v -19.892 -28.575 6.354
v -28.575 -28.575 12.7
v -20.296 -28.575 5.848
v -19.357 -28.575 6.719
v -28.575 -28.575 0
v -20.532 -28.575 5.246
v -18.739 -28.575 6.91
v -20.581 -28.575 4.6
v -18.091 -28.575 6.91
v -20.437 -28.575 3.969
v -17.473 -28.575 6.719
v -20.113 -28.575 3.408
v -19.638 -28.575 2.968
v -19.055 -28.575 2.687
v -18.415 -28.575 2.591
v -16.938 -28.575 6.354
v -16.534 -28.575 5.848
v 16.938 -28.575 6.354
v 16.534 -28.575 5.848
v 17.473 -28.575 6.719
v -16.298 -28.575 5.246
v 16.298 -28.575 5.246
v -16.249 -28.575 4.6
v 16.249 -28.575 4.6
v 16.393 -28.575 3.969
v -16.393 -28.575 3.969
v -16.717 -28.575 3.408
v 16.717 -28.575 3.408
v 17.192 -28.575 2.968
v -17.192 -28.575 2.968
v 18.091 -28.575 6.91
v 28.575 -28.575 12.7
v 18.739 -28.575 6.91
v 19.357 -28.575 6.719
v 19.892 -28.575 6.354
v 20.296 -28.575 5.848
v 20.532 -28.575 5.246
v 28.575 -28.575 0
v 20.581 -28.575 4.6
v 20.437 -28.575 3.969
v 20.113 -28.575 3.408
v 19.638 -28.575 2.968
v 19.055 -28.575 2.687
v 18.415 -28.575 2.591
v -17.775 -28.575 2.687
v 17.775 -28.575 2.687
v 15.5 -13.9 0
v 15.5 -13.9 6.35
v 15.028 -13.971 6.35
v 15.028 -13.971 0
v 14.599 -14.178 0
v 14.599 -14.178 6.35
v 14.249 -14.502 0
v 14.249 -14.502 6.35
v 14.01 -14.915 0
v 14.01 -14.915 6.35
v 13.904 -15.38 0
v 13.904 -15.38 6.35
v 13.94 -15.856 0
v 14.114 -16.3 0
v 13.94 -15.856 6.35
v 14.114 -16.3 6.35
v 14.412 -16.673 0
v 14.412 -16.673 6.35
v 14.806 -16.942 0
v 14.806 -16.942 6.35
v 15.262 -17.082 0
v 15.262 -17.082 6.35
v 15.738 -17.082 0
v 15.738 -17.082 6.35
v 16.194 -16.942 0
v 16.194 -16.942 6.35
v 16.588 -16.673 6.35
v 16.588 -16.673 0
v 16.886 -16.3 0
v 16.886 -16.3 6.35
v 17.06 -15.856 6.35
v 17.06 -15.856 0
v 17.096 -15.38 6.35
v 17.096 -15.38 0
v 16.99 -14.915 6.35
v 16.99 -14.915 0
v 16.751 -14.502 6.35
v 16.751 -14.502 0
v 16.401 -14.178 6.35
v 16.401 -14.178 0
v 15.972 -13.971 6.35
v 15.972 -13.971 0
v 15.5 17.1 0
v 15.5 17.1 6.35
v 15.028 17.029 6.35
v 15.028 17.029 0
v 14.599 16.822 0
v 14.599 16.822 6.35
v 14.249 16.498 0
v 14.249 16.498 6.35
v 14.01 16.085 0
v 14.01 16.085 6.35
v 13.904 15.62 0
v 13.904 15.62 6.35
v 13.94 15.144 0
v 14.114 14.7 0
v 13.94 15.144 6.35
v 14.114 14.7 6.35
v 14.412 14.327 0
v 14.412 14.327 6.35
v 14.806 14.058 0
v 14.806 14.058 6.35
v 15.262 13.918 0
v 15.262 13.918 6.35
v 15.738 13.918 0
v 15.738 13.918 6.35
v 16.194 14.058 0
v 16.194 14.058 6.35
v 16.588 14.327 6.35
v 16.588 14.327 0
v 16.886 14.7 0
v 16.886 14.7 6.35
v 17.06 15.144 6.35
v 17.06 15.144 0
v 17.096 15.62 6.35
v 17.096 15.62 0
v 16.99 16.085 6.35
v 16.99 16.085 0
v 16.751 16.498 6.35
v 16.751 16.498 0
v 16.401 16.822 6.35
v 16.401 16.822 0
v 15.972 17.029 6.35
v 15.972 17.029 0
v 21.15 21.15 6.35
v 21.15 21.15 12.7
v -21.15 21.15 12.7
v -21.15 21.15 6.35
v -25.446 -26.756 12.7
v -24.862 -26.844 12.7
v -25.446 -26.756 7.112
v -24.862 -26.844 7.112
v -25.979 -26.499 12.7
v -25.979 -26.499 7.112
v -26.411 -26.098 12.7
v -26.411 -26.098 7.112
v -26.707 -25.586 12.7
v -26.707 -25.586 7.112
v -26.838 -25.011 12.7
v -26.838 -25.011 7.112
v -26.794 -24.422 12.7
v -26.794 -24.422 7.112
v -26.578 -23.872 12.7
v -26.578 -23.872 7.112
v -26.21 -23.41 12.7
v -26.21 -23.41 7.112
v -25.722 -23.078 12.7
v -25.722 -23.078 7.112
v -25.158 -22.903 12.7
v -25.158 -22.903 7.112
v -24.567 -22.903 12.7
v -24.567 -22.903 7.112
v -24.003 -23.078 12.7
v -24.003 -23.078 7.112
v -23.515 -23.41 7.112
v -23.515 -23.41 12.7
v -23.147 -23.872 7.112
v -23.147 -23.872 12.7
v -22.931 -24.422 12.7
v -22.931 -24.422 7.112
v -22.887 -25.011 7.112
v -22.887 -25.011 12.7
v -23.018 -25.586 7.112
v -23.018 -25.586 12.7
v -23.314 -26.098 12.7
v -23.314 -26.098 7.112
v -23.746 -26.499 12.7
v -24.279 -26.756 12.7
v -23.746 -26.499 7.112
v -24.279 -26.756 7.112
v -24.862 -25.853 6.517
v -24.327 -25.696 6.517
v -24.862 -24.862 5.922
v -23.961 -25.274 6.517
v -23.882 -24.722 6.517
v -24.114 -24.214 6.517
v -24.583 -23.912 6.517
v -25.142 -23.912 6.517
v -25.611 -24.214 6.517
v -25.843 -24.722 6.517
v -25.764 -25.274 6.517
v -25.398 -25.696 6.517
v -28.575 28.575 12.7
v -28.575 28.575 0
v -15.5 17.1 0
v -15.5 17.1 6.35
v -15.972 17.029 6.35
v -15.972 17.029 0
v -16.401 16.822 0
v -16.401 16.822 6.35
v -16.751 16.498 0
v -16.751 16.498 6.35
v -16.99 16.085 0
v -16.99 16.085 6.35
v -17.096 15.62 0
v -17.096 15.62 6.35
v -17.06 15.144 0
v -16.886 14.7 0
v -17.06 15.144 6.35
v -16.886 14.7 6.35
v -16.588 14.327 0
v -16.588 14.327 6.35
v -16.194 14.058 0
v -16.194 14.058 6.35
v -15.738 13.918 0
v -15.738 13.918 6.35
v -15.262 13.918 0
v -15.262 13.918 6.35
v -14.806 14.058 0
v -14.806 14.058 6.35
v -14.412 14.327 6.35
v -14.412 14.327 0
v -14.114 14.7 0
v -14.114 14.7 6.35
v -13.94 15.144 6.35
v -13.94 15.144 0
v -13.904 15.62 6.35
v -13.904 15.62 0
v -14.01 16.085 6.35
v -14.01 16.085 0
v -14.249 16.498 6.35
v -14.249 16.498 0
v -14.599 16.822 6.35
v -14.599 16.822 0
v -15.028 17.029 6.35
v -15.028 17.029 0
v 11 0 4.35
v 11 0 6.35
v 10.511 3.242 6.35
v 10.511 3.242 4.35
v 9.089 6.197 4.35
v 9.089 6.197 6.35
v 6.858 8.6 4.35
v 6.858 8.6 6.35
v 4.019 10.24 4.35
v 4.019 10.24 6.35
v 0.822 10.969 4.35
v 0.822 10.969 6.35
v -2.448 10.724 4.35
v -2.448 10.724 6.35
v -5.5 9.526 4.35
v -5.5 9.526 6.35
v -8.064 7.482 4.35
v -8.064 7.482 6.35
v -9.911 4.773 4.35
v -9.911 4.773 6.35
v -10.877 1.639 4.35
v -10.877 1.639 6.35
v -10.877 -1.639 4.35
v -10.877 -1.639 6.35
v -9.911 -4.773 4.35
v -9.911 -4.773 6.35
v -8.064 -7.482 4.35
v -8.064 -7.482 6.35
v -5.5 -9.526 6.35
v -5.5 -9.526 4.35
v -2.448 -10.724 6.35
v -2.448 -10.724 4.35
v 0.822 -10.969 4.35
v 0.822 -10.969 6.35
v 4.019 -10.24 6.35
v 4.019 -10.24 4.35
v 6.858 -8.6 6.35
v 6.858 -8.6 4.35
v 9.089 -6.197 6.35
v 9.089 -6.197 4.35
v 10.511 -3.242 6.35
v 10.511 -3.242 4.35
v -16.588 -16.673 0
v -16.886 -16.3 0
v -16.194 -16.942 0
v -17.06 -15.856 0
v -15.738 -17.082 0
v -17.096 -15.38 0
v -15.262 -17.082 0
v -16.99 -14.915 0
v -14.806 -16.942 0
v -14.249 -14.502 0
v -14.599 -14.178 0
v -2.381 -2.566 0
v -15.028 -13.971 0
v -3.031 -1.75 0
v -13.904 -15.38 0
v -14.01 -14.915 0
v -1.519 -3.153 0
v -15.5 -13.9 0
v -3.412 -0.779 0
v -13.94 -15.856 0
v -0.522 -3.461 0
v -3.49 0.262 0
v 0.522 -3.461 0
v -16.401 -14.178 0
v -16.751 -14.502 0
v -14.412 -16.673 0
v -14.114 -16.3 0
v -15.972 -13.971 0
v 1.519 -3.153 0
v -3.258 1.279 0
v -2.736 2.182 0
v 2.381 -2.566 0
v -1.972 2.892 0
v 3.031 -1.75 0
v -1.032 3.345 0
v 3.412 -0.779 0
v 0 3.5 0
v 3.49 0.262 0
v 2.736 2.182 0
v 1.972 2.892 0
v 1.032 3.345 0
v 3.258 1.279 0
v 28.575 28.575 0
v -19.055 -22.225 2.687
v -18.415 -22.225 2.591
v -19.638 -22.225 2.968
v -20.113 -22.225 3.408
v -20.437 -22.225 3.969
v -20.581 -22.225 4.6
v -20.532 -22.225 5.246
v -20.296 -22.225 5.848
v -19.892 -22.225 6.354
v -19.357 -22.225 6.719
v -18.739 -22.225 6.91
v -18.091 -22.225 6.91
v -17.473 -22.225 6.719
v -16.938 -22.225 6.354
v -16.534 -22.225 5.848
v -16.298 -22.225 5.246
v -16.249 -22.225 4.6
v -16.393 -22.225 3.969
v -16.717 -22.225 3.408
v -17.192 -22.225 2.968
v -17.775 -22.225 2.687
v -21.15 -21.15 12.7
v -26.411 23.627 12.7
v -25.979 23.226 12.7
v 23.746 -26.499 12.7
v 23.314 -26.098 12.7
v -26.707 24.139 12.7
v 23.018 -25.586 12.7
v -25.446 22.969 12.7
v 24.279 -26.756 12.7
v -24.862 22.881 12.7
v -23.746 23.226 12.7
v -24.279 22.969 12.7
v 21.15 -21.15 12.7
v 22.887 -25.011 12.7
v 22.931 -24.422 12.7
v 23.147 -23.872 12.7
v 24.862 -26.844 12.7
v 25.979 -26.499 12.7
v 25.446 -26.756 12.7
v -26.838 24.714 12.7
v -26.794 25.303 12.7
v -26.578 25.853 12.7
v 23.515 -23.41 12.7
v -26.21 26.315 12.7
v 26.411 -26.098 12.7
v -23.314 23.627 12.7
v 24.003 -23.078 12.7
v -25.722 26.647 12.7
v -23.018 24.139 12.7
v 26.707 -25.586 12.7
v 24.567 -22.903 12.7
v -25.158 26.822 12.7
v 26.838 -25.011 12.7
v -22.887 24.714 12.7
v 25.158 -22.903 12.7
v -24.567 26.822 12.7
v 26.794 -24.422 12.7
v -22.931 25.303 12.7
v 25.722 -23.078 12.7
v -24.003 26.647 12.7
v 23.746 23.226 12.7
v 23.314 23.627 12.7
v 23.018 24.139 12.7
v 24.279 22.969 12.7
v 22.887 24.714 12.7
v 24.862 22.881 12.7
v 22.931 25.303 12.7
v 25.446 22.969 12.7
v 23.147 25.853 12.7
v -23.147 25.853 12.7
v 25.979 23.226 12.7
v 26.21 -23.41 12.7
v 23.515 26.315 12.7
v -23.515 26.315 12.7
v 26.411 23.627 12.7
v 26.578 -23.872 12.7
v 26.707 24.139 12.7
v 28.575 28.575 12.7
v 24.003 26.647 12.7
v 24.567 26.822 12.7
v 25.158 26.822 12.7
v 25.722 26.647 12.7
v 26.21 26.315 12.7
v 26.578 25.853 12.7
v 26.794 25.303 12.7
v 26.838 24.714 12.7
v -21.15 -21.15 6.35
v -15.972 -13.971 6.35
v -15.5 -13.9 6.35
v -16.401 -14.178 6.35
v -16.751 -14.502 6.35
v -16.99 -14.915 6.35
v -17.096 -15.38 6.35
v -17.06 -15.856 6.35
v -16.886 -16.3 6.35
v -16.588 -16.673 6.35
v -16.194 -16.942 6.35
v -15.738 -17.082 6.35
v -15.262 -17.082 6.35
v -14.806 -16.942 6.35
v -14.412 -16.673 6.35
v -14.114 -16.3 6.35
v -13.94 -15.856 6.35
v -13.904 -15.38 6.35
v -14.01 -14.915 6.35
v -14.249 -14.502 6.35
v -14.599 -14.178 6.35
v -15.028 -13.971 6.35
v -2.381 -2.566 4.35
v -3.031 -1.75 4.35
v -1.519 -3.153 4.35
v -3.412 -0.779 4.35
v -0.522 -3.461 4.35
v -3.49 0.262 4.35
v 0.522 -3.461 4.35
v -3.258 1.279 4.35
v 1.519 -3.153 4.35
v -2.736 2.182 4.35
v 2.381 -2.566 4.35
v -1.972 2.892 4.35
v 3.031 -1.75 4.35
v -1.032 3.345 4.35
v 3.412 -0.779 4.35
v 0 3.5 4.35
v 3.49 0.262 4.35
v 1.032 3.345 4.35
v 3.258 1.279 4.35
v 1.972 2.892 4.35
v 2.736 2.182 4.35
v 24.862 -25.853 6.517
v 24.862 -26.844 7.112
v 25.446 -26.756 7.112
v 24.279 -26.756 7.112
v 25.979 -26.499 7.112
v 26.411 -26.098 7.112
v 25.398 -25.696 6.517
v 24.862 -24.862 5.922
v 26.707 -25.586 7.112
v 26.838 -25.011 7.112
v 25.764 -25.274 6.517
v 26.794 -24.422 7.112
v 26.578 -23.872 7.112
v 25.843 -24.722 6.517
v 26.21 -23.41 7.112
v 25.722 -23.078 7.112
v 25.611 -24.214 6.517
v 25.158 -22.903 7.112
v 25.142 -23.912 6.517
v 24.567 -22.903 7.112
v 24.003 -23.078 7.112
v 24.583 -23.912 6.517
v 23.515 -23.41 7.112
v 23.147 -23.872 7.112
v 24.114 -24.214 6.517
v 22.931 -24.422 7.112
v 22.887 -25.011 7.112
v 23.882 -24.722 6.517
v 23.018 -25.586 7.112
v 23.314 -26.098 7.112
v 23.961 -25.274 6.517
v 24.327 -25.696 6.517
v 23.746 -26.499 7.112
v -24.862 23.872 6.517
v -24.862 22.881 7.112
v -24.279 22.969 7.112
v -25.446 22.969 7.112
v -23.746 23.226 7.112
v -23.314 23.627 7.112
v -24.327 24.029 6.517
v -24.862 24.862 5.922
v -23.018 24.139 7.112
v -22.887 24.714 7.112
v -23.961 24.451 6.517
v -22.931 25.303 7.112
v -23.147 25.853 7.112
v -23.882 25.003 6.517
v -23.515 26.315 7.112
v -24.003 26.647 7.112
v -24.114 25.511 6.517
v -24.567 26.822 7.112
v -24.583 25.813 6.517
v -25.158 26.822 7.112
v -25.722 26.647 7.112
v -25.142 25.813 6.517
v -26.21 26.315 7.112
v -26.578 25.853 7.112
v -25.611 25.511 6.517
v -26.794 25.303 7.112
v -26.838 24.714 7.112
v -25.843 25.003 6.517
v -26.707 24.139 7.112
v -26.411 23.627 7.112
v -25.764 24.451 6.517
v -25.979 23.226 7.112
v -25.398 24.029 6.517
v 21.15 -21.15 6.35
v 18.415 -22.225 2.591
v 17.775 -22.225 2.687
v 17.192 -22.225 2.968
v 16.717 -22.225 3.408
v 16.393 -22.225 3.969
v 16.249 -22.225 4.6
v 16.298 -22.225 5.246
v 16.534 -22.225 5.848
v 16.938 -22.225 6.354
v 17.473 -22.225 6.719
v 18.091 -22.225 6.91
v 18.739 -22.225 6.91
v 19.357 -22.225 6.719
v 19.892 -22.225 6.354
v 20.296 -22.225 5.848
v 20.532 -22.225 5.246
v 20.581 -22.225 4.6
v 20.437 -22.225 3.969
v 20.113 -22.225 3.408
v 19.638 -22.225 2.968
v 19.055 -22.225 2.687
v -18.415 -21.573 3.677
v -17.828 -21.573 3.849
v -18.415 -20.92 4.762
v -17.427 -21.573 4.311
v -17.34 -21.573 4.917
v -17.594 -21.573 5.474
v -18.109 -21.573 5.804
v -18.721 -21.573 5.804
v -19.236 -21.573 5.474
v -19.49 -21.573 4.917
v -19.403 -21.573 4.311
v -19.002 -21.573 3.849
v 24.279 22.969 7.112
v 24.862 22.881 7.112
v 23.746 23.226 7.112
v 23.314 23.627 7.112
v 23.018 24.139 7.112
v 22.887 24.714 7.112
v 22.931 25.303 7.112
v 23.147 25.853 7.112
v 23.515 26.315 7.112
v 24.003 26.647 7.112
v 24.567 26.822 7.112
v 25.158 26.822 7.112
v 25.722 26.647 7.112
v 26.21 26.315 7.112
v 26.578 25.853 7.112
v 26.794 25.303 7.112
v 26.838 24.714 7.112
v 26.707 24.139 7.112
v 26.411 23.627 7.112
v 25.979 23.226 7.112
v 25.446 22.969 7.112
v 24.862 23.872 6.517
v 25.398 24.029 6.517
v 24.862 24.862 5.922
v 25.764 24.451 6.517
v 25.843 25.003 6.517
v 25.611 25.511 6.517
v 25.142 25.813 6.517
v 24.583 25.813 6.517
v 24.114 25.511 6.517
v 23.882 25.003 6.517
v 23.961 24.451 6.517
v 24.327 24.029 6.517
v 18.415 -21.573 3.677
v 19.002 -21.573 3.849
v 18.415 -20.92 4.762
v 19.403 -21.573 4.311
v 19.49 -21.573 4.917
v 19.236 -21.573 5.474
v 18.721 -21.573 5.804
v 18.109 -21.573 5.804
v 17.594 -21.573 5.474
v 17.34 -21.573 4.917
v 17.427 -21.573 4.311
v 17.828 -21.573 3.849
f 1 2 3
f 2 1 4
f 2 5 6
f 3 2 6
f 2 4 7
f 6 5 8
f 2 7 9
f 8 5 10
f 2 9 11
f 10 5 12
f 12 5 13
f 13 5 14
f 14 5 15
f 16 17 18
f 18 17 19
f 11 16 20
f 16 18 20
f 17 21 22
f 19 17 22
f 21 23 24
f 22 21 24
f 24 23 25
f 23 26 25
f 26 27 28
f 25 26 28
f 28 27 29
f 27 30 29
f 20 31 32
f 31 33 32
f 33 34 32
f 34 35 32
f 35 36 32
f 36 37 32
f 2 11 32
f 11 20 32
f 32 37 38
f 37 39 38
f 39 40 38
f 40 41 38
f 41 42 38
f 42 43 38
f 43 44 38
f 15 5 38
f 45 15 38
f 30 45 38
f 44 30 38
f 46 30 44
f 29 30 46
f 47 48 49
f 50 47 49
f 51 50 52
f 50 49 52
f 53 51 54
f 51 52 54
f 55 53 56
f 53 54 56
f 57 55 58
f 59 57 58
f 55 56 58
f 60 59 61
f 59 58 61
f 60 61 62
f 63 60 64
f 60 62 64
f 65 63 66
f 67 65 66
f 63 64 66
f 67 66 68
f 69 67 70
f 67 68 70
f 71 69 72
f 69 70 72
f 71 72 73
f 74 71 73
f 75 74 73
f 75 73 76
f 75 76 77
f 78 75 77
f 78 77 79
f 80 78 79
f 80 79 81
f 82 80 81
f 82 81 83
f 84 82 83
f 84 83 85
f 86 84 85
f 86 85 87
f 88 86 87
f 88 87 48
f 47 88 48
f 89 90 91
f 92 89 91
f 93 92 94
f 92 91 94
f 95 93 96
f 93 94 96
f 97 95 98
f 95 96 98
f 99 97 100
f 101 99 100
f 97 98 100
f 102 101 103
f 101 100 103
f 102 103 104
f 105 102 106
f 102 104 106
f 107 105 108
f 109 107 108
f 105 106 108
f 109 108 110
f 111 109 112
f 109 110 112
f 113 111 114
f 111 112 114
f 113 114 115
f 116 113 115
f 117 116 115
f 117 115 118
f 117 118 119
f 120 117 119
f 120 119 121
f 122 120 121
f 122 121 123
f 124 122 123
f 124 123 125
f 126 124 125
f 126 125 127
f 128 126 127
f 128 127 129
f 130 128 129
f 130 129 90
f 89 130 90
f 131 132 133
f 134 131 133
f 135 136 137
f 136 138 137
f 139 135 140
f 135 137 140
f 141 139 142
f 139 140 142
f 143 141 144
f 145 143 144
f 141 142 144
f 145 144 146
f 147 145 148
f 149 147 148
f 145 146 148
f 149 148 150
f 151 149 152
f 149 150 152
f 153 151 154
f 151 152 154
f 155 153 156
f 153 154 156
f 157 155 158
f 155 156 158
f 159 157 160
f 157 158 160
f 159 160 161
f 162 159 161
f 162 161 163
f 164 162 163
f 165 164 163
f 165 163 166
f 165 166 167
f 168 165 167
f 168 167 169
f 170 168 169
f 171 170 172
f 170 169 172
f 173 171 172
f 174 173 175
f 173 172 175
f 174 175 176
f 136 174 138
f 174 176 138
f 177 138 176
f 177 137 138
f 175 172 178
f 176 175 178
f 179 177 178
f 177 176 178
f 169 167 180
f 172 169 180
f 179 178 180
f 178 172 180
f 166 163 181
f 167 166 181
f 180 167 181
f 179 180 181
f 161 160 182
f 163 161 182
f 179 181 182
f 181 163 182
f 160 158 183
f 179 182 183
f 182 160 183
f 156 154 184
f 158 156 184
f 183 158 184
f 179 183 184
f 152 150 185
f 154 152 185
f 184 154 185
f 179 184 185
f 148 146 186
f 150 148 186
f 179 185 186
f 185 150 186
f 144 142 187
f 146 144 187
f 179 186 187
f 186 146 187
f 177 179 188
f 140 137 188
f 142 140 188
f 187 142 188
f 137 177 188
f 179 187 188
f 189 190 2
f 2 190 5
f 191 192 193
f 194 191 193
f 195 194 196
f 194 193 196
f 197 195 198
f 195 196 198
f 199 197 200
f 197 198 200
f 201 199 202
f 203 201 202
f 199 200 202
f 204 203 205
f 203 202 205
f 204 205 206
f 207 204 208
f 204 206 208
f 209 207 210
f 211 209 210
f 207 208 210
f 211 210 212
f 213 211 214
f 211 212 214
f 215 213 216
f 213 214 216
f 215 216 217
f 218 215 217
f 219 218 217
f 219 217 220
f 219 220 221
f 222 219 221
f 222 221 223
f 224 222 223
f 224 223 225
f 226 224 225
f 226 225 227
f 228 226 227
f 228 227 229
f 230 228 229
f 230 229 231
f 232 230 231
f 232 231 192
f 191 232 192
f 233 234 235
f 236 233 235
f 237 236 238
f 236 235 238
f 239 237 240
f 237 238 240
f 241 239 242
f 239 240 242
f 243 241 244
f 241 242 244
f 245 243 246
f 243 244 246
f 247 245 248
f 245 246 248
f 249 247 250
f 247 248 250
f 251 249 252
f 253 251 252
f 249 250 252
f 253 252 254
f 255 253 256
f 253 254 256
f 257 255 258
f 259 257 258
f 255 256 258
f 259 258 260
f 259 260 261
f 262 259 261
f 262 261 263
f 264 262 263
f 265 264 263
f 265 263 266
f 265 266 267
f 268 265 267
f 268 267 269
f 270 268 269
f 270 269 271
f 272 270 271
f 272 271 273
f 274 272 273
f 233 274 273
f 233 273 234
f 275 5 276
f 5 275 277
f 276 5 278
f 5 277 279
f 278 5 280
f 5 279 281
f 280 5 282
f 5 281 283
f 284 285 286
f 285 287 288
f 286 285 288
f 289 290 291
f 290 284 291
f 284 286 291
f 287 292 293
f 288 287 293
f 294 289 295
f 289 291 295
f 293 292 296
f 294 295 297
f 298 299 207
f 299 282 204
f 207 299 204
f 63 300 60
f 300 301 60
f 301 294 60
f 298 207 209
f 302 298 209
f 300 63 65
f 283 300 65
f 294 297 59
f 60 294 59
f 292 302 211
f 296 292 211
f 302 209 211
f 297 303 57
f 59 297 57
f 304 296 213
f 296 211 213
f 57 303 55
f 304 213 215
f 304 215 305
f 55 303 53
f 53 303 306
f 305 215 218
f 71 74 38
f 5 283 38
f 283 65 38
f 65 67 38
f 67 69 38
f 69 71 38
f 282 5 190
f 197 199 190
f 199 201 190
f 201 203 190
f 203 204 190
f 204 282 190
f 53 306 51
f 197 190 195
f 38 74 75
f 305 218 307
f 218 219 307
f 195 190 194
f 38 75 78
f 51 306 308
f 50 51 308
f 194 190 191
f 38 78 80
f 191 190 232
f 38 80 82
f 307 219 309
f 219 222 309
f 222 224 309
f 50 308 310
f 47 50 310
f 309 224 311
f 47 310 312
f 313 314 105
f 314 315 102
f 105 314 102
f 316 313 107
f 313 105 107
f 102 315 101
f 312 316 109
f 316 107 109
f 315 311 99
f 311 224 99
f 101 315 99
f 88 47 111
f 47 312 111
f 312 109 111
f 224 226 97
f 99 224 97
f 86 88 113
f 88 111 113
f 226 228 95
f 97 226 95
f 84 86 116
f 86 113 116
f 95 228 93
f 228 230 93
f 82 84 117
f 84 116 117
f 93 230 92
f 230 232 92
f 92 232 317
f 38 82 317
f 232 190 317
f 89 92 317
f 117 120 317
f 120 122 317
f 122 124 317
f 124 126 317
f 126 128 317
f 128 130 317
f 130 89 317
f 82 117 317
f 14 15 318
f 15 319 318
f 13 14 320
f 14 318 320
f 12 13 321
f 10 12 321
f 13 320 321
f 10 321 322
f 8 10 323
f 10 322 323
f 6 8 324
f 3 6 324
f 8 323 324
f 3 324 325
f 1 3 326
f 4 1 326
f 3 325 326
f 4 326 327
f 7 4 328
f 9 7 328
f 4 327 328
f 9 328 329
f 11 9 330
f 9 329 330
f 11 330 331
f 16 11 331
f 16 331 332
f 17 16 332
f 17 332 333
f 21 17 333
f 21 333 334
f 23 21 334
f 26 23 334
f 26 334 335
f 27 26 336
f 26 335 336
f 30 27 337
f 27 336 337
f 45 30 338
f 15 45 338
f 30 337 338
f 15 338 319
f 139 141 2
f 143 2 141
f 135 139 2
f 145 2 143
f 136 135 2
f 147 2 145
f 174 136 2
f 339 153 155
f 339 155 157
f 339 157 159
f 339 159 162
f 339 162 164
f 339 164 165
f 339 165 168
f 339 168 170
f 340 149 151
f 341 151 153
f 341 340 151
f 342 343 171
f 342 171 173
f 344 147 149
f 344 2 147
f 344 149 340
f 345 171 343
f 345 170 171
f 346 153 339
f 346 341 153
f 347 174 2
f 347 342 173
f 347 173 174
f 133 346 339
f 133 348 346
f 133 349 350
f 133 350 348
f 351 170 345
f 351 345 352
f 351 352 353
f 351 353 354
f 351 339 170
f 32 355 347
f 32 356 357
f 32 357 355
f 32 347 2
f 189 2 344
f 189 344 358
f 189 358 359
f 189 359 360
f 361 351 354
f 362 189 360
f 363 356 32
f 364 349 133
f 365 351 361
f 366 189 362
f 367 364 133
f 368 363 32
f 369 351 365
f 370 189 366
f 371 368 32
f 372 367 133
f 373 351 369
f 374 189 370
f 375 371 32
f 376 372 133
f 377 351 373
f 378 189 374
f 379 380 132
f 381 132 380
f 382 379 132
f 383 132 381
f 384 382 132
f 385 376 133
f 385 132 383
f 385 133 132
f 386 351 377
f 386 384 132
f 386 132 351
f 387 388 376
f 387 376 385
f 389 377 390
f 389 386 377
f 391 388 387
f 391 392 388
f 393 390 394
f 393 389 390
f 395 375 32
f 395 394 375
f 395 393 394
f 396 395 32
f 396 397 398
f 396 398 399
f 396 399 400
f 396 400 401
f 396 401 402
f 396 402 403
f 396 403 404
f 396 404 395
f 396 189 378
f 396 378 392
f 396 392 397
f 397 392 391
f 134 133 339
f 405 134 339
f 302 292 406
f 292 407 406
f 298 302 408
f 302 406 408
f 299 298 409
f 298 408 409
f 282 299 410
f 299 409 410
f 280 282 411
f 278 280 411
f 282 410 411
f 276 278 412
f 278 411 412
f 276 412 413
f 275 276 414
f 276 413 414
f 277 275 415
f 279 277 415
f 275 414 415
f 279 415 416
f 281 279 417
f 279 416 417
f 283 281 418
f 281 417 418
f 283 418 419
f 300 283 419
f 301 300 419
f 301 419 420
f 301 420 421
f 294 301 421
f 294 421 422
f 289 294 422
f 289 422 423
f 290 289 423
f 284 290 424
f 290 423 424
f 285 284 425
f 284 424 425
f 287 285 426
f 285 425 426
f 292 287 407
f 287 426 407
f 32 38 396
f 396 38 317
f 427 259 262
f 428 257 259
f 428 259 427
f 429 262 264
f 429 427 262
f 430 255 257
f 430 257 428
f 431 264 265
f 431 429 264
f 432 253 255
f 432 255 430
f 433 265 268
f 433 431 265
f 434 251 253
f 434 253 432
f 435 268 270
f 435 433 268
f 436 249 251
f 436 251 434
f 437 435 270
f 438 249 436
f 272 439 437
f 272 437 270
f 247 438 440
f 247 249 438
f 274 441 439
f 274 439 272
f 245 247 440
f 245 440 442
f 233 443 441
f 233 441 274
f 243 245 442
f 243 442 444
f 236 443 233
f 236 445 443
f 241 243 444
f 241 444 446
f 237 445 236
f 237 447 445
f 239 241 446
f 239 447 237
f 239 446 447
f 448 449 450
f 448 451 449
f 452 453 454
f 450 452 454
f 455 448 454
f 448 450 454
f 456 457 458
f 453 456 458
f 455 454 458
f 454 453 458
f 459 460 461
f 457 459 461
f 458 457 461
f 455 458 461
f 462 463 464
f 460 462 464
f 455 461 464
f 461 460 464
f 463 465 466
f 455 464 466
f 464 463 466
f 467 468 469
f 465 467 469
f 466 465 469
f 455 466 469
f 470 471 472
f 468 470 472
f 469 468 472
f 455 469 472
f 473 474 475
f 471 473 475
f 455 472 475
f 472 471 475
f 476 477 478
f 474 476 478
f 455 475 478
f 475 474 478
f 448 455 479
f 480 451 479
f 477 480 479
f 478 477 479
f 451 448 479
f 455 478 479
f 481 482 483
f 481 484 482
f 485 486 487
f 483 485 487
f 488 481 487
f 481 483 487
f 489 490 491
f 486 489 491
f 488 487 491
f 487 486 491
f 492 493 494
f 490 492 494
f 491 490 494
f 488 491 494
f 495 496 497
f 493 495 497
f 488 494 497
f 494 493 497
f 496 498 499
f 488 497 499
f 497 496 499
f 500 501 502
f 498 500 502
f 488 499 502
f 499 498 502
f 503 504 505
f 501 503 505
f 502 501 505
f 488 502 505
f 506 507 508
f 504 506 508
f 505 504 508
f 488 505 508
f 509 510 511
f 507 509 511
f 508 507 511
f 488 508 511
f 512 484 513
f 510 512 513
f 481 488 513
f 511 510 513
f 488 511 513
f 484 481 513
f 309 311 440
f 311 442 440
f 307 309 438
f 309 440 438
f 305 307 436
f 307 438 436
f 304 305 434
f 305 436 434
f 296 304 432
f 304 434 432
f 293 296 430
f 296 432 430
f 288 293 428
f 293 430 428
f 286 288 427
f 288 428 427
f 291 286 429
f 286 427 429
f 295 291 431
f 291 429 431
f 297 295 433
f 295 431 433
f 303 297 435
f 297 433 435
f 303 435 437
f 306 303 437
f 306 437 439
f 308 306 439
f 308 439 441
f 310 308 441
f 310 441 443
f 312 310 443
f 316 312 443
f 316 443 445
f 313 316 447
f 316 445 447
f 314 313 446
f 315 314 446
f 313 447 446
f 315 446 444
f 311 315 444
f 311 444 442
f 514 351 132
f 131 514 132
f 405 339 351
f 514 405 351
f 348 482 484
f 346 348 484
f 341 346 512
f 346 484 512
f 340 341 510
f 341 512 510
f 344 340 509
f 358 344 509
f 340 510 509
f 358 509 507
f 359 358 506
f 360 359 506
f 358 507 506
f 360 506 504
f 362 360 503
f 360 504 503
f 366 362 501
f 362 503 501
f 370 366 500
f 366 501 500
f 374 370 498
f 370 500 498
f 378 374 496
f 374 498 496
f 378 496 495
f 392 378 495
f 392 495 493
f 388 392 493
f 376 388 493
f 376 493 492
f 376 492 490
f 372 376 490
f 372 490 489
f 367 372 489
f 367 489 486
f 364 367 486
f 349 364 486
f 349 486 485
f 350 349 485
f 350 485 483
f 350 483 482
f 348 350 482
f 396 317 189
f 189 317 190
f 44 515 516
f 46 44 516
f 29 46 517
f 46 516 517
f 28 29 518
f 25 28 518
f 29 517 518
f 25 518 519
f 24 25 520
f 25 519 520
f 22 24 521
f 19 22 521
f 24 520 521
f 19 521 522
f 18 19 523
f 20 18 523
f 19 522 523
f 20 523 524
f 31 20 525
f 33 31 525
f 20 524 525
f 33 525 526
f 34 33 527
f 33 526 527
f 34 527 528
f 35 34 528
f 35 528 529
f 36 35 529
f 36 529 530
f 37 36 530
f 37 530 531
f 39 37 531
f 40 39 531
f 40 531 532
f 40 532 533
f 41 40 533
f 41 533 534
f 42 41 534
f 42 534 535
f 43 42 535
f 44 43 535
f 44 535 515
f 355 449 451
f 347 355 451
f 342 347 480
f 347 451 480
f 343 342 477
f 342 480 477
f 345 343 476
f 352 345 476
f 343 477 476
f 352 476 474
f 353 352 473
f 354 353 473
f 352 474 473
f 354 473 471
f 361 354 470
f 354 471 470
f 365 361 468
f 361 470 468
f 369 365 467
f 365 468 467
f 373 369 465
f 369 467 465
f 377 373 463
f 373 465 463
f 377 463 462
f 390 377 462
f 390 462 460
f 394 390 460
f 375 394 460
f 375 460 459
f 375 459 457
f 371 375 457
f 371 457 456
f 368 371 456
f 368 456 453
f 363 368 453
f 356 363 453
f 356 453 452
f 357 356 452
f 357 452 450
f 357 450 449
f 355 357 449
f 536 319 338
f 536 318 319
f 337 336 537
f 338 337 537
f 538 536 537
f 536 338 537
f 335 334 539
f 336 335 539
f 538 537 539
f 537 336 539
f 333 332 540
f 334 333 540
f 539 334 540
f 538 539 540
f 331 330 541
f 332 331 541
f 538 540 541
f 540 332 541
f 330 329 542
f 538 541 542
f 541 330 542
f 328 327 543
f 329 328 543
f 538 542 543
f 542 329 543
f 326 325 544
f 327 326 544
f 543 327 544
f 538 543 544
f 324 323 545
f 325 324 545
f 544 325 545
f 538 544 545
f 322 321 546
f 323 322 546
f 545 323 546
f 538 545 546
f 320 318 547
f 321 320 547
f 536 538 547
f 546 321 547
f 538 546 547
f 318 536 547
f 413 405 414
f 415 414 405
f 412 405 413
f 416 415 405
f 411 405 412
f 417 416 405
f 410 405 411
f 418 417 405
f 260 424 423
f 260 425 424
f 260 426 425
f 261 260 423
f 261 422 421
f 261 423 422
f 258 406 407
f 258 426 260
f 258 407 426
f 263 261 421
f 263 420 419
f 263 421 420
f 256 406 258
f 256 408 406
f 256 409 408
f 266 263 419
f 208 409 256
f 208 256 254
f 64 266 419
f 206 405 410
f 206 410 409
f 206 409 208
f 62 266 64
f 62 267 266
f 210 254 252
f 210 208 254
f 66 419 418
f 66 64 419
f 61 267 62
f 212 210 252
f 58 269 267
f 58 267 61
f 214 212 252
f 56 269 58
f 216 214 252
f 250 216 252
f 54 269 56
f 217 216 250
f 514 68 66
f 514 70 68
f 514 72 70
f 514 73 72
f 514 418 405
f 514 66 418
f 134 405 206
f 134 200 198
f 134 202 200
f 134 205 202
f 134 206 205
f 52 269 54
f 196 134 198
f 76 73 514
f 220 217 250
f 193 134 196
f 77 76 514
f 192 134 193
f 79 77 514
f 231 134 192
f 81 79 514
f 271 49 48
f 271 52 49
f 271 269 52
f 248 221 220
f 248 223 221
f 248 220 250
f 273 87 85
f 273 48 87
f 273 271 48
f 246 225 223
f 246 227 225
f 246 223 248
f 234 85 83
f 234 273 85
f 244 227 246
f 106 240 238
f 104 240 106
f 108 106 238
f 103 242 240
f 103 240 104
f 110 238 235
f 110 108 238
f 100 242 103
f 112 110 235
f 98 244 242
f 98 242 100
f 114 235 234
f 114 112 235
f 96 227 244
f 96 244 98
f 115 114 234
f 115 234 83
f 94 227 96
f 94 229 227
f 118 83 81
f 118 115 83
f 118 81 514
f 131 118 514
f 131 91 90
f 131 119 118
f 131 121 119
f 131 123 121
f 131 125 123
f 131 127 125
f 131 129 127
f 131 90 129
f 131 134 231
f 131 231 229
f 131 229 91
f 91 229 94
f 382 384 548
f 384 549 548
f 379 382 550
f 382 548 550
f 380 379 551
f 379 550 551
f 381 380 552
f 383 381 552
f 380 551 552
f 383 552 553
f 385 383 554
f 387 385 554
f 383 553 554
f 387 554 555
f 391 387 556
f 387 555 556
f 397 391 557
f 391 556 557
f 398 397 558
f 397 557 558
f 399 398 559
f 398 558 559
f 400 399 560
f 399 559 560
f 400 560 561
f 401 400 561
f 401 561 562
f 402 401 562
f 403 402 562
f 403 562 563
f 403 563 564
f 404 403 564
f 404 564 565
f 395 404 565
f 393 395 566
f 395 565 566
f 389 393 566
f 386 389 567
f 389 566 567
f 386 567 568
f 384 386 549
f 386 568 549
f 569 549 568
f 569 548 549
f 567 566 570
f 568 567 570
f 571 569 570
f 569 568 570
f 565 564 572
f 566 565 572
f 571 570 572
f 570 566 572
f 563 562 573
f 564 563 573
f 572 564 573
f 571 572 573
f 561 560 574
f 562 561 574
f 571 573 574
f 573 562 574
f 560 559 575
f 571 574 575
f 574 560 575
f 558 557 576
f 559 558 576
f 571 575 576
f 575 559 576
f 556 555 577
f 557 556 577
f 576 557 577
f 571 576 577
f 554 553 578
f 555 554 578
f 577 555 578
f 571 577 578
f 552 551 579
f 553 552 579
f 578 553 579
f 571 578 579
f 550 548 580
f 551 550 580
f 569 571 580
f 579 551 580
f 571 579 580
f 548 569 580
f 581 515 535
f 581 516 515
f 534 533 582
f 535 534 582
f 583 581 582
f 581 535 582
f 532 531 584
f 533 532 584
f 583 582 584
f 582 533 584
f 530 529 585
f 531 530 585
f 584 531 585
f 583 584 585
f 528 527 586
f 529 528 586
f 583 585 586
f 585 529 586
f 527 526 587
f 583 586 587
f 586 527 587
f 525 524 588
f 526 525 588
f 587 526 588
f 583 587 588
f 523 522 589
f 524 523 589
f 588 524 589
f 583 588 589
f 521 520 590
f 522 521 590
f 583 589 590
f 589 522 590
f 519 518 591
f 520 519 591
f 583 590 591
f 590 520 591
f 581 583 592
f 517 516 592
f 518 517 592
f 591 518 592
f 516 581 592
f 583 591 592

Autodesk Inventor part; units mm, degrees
ref_plane "YZ Plane" through (0, 0, 0) normal (1, 0, 0) x (0, 1, 0)
ref_plane "XZ Plane" through (0, 0, 0) normal (0, 1, 0) x (-1, 0, 0)
ref_plane "XY Plane" through (0, 0, 0) normal (0, 0, 1) x (1, 0, 0)
sketch "Sketch1" plane through (0, 0, 0) normal (0, 0, 1) x (1, 0, 0)
  line L0 (-28.575, -28.575) -> (28.575, -28.575)
  line L1 (28.575, -28.575) -> (28.575, 28.575)
  line L2 (28.575, 28.575) -> (-28.575, 28.575)
  line L3 (-28.575, 28.575) -> (-28.575, -28.575)
  line L4 (-28.575, -28.575) -> (28.575, 28.575) construction
  line L5 (28.575, -28.575) -> (-28.575, 28.575) construction
  point P0 (0, 0)
  dimension "d0" = 57.15
  dimension "d1" = 57.15
extrude "Extrusion1" add sketch "Sketch1" along normal blind 12.7
sketch "Sketch2" plane through (0, 0, 12.7) normal (0, 0, 1) x (1, 0, 0)
  line L0 (-21.15, -21.15) -> (21.15, -21.15)
  line L1 (21.15, -21.15) -> (21.15, 21.15)
  line L2 (21.15, 21.15) -> (-21.15, 21.15)
  line L3 (-21.15, 21.15) -> (-21.15, -21.15)
  line L4 (-21.15, -21.15) -> (21.15, 21.15) construction
  line L5 (21.15, -21.15) -> (-21.15, 21.15) construction
  point P0 (0, 0)
  dimension "d4" = 42.3
  dimension "d5" = 42.3
extrude "Extrusion2" cut sketch "Sketch2" against normal blind 6.35
sketch "Sketch3" plane through (0, 0, 0) normal (0, 0, -1) x (-1, 0, 0)
  line L0 (-15.5, -15.5) -> (15.5, -15.5) construction
  line L1 (15.5, -15.5) -> (15.5, 15.5) construction
  line L2 (15.5, 15.5) -> (-15.5, 15.5) construction
  line L3 (-15.5, 15.5) -> (-15.5, -15.5) construction
  line L4 (-15.5, -15.5) -> (15.5, 15.5) construction
  line L5 (15.5, -15.5) -> (-15.5, 15.5) construction
  point P0 (0, 0)
  dimension "d8" = 31
  dimension "d9" = 31
hole "Hole1" at (15.5, 15.5, 0) at (-15.5, 15.5, 0) at (-15.5, -15.5, 0) at (15.5, -15.5, 0) direction (0, 0, 1) diameter 3.2004 end through all clearance for "Flat Head Machine Screw" size "M3" standard "Ansi Metric M Profile"
sketch "Sketch4" plane through (0, 0, 0) normal (0, 0, -1) x (-1, 0, 0)
  point P0 (0, 0)
  point P1 (0, 0)
sketch "Sketch5" plane through (0, 0, 6.35) normal (0, 0, 1) x (1, 0, 0)
  circle A0 centre (0, 0) radius 11
  dimension "d17" = 22
extrude "Extrusion3" cut sketch "Sketch5" against normal blind 2
hole "Hole2" at (0, 0, 0) direction (0, 0, 1) diameter 7 end through all
sketch "Sketch6" plane through (-28.575, -28.575, 0) normal (0, -1, 0) x (1, 0, 0)
  line L0 (57.15, 0) -> (57.15, 12.7) projected
  line L1 (0, 12.7) -> (57.15, 12.7) projected
  line L2 (0, 0) -> (0, 12.7) projected
  line L3 (28.575, 12.7) -> (28.575, 0) construction
  line L4 (0, 0) -> (57.15, 0) projected
  line L5 (10.16, 4.7625) -> (46.99, 4.7625) construction
  dimension "d27" = 12.7
  dimension "d28" = 10.16
  dimension "d29" = 10.16
  dimension "d45" = 7.9375
hole "Hole3" at (-18.415, -28.575, 4.7625) at (18.415, -28.575, 4.7625) direction (0, 1, 0) diameter 4.3434 depth 6.35 tip angle 118 thread size "12-24 UNC" class "2B" standard "ANSI Unified Screw Threads"
sketch "Sketch7" plane through (0, 0, 12.7) normal (0, 0, 1) x (1, 0, 0)
  line L0 (-21.15, 21.15) -> (21.15, 21.15) projected
  line L1 (-28.575, -28.575) -> (28.575, -28.575) projected
  line L2 (28.575, 28.575) -> (-28.575, 28.575) projected
  line L3 (28.575, -28.575) -> (-28.575, 28.575) construction
  line L4 (28.575, 28.575) -> (-28.575, -28.575) construction
  line L5 (0, 28.575) -> (0, 21.15) construction
  line L6 (0, 24.8625) -> (24.8625, 24.8625) construction
  line L7 (-24.8625, -24.8625) -> (24.8625, -24.8625) construction
  line L8 (24.8625, -24.8625) -> (24.8625, 24.8625) construction
  line L9 (24.8625, 24.8625) -> (-24.8625, 24.8625) construction
  line L10 (-24.8625, 24.8625) -> (-24.8625, -24.8625) construction
  line L11 (-24.8625, -24.8625) -> (24.8625, 24.8625) construction
  line L12 (24.8625, -24.8625) -> (-24.8625, 24.8625) construction
  point P0 (0, 0)
hole "Hole4" at (-24.8625, 24.8625, 12.7) at (24.8625, 24.8625, 12.7) at (24.8625, -24.8625, 12.7) at (-24.8625, -24.8625, 12.7) direction (0, 0, -1) diameter 3.9624 depth 5.588 tip angle 118 thread size "10-32 UNF" class "2B" standard "ANSI Unified Screw Threads"
equation "\"d29\" = d28"
properties part number "NEMA_17-front" material "Aluminum 6061"
